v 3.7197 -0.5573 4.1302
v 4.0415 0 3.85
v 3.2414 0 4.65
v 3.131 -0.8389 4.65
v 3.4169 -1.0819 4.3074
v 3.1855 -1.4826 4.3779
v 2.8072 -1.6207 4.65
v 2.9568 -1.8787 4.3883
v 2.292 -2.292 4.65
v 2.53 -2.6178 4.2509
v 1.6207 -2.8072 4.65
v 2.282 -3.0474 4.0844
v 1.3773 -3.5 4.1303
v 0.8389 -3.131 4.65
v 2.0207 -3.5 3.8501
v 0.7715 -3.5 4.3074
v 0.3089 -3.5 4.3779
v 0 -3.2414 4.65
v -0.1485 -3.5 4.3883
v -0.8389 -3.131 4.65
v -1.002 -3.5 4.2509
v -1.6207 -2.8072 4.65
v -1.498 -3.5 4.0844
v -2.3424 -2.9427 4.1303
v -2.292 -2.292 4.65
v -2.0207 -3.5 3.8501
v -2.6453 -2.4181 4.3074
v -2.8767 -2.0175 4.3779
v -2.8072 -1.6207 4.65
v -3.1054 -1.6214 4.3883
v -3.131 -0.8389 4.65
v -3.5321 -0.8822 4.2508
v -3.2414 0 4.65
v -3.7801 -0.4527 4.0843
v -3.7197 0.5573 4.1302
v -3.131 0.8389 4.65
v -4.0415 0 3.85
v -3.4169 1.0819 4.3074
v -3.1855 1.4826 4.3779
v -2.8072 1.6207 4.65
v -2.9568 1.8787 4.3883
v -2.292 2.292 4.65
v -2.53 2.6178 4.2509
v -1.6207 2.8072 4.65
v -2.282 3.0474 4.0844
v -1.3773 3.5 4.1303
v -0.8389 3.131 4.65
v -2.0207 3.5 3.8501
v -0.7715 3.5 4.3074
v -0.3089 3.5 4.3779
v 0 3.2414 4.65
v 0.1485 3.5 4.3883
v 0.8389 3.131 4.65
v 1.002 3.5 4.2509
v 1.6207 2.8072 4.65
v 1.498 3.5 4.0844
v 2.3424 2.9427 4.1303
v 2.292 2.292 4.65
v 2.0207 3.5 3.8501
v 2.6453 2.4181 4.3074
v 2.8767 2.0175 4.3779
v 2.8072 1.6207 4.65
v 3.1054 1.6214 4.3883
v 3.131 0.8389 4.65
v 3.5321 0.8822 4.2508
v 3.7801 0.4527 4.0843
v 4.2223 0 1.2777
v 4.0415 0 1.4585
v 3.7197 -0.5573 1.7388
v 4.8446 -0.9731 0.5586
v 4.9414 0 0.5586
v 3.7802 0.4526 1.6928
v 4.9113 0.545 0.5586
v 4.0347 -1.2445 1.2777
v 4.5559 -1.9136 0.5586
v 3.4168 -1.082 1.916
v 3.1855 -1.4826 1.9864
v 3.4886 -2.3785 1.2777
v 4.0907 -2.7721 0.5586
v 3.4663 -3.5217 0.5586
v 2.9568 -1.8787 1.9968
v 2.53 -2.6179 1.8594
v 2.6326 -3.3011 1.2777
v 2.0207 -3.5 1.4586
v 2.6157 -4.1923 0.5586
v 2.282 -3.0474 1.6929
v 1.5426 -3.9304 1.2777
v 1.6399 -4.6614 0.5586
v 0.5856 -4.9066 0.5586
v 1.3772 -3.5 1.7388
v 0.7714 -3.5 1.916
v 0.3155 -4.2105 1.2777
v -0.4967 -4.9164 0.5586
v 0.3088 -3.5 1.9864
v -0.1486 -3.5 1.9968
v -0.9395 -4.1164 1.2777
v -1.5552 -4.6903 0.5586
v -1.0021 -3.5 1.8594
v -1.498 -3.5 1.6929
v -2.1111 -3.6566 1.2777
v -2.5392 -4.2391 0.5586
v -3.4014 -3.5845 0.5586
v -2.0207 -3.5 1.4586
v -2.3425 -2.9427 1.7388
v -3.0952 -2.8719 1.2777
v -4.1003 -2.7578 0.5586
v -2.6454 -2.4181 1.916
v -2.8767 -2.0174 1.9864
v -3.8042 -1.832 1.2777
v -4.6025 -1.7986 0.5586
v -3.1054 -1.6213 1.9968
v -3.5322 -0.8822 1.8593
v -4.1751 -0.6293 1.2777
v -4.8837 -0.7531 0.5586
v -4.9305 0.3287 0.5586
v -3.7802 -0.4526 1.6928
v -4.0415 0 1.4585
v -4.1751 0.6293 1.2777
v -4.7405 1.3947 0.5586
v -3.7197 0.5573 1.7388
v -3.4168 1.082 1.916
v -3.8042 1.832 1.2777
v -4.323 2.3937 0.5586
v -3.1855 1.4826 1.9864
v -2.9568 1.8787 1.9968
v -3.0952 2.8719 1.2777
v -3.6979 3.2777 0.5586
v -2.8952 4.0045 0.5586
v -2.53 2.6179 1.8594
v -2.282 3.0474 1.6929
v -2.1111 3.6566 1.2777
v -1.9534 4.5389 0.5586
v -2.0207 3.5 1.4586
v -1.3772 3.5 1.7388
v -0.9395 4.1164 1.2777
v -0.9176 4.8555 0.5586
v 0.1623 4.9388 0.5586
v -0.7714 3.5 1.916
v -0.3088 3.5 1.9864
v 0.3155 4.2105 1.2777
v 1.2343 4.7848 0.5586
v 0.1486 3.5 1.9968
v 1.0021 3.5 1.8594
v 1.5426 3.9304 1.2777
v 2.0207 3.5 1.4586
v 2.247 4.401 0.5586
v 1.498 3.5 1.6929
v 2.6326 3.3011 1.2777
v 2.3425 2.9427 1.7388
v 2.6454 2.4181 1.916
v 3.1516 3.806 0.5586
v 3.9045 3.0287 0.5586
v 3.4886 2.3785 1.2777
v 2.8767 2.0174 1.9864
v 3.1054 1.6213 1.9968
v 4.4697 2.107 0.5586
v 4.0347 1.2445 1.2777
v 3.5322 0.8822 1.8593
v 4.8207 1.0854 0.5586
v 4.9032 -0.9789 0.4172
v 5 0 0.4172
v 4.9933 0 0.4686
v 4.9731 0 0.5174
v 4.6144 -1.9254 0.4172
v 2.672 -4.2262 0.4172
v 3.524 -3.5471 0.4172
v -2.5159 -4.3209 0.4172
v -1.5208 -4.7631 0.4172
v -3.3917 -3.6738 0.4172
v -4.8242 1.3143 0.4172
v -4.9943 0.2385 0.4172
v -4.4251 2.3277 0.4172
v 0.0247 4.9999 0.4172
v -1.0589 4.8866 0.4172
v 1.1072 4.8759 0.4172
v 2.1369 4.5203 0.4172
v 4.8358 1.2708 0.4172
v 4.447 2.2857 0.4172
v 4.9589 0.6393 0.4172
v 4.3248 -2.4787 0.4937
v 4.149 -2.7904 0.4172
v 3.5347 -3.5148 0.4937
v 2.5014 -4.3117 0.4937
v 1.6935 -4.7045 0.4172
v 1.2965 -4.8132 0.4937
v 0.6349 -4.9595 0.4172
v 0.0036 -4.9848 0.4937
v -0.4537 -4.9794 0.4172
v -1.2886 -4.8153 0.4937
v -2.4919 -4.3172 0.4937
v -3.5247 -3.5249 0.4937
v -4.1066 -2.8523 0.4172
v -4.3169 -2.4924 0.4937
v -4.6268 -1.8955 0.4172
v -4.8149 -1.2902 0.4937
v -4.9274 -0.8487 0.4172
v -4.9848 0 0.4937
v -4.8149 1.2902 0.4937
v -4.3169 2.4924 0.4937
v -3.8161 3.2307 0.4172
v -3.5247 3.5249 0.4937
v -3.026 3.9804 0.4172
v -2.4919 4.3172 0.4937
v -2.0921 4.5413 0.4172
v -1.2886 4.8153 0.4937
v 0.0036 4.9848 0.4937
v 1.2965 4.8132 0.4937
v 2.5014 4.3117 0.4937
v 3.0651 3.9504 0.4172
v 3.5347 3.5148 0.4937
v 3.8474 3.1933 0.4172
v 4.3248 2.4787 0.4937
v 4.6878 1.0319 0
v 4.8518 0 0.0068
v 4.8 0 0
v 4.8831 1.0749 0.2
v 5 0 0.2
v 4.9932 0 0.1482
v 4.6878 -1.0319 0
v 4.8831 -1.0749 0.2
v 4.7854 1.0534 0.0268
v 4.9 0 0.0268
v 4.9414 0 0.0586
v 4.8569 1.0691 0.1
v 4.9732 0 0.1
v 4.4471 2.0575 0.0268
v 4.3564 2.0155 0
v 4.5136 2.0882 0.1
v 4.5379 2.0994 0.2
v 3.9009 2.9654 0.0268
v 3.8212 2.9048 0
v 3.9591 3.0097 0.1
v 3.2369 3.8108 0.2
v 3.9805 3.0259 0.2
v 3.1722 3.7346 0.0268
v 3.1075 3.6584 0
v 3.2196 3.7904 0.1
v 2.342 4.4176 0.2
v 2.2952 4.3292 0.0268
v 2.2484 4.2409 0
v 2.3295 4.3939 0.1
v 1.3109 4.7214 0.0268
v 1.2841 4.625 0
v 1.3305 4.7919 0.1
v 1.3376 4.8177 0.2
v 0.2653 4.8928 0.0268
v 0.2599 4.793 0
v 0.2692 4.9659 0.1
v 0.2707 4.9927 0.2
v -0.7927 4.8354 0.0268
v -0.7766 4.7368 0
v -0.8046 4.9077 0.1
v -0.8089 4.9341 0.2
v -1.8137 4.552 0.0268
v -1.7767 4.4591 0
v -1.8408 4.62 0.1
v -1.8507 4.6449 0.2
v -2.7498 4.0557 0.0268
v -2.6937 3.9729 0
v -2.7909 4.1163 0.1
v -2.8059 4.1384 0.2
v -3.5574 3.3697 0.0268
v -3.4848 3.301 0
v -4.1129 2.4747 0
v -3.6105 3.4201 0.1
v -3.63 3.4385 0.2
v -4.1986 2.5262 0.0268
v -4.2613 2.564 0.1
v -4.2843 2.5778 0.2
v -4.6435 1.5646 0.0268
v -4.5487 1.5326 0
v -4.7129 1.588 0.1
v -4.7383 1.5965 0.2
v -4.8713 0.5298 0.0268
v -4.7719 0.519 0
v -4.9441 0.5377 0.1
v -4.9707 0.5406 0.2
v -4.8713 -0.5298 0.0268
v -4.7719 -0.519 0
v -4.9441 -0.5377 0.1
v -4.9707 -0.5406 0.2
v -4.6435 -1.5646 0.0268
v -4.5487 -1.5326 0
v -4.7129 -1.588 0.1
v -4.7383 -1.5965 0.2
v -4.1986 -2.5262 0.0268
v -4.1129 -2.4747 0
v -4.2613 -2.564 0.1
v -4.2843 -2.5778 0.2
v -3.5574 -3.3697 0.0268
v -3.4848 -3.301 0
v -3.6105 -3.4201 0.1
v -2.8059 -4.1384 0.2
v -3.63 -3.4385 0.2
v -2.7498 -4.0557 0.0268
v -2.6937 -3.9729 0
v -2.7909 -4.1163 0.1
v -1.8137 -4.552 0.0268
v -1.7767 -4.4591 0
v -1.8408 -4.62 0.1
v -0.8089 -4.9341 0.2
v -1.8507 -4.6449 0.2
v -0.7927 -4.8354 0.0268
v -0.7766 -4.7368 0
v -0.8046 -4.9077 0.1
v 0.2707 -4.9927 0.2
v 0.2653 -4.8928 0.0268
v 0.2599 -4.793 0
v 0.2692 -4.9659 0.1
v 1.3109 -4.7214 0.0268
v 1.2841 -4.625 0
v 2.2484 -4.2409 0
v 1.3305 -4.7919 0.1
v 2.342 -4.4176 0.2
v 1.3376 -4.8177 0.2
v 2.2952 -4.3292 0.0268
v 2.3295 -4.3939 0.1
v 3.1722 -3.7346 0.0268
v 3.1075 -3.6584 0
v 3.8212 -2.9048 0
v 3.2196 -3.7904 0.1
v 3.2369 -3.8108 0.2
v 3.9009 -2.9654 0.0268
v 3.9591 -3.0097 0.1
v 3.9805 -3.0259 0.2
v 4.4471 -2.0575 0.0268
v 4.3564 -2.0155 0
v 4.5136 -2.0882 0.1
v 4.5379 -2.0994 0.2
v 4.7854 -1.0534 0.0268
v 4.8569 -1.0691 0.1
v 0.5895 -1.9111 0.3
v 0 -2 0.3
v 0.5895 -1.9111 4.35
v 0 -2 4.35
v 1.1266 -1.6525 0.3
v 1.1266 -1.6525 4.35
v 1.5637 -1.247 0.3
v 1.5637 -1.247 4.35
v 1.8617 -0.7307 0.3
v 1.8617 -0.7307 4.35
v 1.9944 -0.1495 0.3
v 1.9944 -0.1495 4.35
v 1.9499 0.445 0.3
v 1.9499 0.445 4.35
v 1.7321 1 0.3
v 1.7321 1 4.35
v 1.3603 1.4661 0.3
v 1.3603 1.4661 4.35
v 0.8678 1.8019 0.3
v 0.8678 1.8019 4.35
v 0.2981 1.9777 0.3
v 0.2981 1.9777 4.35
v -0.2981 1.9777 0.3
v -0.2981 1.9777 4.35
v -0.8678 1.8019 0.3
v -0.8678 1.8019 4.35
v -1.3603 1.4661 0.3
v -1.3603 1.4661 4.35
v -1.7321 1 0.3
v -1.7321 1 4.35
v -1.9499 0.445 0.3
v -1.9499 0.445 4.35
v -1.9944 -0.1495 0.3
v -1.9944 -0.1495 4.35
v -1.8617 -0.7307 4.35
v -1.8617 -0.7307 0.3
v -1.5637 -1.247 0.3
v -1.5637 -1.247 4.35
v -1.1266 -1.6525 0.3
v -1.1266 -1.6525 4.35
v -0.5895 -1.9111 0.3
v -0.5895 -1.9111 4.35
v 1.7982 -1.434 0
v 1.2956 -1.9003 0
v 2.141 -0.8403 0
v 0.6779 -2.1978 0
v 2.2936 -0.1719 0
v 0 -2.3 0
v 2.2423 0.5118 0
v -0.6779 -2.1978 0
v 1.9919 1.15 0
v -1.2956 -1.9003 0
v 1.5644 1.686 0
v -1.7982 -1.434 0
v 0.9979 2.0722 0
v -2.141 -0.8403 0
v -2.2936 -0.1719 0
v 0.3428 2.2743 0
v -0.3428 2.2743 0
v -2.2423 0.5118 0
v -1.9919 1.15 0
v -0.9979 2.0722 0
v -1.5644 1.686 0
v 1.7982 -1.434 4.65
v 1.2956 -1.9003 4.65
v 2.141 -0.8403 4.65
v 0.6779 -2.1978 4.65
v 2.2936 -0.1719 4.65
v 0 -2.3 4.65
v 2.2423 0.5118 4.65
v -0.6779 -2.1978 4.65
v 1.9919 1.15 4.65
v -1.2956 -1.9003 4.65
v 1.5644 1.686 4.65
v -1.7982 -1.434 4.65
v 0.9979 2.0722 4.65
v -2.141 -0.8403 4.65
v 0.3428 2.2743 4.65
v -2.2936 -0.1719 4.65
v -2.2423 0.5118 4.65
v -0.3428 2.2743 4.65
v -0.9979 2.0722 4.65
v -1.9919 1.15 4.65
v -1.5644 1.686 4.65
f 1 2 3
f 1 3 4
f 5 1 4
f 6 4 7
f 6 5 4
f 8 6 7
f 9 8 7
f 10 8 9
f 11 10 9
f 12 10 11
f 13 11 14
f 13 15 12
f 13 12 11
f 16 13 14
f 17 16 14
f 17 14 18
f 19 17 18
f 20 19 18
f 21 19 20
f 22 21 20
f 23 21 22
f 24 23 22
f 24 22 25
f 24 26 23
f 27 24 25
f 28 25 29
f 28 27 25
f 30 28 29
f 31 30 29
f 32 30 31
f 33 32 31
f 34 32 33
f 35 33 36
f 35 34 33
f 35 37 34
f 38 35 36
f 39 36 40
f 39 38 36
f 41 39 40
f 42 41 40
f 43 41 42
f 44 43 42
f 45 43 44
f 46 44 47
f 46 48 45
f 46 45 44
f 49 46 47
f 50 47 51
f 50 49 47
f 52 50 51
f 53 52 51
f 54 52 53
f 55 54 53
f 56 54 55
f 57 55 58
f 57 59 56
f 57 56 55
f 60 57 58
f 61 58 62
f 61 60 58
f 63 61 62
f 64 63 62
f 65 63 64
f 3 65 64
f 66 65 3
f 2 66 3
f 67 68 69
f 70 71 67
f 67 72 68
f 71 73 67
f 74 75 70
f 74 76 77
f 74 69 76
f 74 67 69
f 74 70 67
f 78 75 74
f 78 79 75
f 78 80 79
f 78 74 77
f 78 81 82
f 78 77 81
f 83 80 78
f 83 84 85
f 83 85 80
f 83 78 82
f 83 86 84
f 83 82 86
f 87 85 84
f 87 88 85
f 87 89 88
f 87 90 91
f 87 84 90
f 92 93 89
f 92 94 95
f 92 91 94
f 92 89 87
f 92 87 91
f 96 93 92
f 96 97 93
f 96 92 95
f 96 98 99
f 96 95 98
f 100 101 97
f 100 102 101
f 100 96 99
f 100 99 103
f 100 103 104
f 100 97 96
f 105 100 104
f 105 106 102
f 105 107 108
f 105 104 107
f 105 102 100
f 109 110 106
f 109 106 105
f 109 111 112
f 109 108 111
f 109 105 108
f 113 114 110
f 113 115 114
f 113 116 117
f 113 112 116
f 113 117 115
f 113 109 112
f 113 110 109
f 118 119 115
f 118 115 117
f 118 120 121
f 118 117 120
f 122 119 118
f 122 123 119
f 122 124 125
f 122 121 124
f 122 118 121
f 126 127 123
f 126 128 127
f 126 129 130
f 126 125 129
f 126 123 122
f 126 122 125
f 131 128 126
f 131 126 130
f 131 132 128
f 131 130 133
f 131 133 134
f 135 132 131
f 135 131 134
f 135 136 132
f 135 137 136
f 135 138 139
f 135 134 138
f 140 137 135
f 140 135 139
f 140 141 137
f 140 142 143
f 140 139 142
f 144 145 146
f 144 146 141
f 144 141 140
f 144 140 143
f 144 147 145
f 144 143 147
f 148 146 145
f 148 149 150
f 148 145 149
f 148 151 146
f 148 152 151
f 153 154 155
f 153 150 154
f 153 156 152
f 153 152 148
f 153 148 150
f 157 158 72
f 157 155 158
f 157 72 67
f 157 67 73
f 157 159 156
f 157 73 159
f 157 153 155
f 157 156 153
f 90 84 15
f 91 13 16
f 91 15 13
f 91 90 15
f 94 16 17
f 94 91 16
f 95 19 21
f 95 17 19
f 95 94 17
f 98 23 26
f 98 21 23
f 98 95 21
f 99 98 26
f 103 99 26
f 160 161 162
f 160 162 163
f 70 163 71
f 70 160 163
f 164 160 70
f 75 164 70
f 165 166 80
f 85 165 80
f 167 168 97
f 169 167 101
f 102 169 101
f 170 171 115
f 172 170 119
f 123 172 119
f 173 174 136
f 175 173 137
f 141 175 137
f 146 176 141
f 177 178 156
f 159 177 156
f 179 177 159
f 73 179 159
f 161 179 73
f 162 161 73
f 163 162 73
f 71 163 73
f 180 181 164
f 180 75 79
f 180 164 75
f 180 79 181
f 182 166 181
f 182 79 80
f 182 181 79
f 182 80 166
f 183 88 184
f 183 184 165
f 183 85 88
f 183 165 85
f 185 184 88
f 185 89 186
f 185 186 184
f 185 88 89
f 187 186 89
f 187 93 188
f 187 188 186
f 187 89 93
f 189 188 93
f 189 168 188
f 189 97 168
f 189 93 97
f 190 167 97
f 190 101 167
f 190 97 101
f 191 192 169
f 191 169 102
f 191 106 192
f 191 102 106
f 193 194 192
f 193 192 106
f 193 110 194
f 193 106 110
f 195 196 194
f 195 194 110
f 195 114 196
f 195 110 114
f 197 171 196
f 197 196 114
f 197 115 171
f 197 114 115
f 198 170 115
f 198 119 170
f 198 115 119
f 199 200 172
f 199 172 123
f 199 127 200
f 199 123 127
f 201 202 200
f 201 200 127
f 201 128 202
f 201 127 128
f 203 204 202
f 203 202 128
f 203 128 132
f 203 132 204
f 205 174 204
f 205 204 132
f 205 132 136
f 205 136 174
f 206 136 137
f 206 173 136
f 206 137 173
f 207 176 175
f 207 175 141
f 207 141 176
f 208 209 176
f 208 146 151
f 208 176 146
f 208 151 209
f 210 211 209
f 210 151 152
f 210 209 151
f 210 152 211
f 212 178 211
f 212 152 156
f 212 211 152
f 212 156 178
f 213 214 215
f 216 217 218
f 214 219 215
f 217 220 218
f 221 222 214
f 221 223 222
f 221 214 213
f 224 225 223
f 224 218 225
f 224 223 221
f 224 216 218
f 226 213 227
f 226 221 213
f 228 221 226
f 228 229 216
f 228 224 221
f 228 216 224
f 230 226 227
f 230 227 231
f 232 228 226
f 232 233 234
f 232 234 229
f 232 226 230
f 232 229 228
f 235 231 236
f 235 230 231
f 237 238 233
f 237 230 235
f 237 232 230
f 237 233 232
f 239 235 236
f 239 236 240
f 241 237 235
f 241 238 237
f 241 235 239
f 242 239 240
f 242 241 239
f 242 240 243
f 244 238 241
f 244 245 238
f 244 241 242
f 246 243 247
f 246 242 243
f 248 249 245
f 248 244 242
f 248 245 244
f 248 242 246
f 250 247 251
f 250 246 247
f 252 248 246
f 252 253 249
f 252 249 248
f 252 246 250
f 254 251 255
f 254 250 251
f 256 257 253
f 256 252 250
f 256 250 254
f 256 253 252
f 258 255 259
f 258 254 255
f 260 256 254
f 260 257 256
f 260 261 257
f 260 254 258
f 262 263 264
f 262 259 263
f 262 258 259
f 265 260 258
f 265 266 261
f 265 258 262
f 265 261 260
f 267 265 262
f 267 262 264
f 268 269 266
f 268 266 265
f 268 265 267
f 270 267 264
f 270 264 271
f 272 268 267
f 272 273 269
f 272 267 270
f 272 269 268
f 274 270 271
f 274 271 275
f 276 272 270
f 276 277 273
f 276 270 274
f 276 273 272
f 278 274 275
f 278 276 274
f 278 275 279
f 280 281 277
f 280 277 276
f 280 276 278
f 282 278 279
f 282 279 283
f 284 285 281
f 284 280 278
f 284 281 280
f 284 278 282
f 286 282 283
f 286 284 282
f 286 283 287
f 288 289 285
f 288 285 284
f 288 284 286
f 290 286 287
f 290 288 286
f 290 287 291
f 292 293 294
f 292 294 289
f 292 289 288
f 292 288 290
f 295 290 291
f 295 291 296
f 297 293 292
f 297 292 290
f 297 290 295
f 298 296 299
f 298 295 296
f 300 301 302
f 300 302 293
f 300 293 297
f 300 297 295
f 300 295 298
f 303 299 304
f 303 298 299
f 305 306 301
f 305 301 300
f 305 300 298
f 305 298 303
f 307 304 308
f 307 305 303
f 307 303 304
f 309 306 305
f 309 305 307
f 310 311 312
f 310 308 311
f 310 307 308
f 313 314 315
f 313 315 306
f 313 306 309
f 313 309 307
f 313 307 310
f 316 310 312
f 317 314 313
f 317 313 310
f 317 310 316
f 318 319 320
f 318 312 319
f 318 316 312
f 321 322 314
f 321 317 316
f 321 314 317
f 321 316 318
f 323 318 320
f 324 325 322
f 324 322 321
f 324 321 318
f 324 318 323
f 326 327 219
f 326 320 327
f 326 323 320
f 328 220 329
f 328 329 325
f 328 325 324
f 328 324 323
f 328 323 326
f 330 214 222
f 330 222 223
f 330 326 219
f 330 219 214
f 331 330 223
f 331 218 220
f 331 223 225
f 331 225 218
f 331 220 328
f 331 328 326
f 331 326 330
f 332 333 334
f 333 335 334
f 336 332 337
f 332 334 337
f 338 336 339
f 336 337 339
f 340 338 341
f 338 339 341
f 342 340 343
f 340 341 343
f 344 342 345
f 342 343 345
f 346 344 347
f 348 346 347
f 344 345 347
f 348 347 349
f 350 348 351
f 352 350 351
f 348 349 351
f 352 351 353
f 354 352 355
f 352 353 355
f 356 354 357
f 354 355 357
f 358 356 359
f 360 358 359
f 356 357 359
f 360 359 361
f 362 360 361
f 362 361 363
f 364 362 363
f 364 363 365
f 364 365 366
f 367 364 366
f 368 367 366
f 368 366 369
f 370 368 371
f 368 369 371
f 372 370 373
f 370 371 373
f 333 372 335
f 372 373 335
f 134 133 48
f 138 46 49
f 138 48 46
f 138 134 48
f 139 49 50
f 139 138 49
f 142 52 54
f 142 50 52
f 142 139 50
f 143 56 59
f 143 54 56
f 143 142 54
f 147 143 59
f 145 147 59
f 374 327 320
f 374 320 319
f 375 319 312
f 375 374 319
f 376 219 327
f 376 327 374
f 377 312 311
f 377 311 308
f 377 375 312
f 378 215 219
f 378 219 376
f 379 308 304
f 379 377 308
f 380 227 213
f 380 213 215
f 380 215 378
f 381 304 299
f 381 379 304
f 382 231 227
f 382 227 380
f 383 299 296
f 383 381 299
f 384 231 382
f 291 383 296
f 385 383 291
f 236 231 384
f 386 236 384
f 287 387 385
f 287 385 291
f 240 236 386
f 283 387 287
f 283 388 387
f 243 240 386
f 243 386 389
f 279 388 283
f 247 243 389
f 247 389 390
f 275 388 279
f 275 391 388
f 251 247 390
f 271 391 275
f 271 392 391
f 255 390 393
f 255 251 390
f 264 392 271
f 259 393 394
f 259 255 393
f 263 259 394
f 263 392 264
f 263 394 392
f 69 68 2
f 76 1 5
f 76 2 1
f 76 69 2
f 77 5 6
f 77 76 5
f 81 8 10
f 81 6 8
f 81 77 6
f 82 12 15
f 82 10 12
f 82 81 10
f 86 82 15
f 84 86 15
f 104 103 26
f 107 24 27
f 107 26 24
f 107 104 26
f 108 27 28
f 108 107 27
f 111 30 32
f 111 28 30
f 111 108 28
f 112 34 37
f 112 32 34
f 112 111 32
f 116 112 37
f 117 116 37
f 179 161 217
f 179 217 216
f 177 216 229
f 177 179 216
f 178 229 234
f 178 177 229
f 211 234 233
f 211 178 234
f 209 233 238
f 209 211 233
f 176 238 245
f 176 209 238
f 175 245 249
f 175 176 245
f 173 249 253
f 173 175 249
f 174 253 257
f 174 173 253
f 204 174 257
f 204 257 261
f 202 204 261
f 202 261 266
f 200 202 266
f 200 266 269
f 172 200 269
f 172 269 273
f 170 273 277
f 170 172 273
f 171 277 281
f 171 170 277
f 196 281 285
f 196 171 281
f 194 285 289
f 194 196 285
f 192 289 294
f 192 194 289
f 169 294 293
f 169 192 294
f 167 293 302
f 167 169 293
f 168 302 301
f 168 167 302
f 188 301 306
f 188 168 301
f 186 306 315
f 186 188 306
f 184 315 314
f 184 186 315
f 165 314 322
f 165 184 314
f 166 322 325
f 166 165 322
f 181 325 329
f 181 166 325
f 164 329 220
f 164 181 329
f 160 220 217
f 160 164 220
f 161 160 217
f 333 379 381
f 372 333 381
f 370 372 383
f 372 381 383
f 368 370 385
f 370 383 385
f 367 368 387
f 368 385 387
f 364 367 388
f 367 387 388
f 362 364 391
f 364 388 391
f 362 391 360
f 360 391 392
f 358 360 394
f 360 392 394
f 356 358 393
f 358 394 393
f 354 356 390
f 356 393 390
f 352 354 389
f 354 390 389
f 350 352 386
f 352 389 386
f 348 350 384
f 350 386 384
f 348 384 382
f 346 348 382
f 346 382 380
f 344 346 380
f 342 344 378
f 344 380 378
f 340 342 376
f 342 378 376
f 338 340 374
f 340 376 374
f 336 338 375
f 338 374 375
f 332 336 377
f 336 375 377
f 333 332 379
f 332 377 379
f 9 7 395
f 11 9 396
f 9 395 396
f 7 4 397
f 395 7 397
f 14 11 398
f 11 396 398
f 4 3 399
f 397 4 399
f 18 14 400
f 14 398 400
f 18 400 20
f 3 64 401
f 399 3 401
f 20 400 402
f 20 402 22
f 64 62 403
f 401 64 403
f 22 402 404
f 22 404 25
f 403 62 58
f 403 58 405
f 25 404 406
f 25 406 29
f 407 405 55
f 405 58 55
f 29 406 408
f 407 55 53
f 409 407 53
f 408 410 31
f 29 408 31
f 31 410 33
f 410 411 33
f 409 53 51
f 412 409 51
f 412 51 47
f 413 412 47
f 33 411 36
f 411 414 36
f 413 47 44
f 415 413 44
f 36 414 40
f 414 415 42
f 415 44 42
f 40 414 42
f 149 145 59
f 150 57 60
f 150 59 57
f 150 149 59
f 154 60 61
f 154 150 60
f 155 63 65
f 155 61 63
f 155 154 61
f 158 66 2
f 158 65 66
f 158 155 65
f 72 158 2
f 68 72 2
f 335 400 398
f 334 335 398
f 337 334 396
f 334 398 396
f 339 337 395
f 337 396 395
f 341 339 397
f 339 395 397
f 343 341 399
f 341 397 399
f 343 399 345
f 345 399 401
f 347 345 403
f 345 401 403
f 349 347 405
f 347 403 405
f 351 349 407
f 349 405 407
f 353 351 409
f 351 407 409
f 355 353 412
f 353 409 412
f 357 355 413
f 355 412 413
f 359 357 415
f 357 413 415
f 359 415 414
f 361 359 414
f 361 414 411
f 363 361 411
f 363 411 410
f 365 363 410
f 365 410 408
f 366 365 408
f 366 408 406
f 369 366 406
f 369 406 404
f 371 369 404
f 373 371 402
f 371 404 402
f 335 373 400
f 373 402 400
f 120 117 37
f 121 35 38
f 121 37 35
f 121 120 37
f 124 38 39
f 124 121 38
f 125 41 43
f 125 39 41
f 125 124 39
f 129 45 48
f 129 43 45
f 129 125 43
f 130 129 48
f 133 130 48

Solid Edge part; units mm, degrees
sketch "Sketch1" plane through (0, 0, 0) normal (0, 0, 1) x (1, 0, 0)
  line L0 (-2.0207, 3.5) -> (2.0207, 3.5)
  line L1 (2.0207, 3.5) -> (4.0415, 0)
  line L2 (4.0415, 0) -> (2.0207, -3.5)
  line L3 (2.0207, -3.5) -> (-2.0207, -3.5)
  line L4 (-2.0207, -3.5) -> (-4.0415, 0)
  line L5 (-4.0415, 0) -> (-2.0207, 3.5)
  dimension "D1" = 7
extrude "Protrusion1" add sketch "Sketch1" along normal blind 4.65
sketch "Sketch2" plane through (0, 0, 0) normal (0, -1, 0) x (1, 0, 0)
  line L0 (4.0415, 3.85) -> (2.574, 5.3174)
  line L1 (2.574, 5.3174) -> (4.6962, 5.3174)
  line L2 (4.6962, 5.3174) -> (4.6962, 3.85)
  line L3 (4.6962, 3.85) -> (4.0415, 3.85)
  dimension "D1" = 0.8
revolve "RevolvedCutout1" cut sketch "Sketch2" angle 360 about axis through (0, 0, 54) along (0, 0, -1)
sketch "Sketch3" plane through (0, 0, 0) normal (0, -1, 0) x (1, 0, 0)
  line L0 (0, 0) -> (5, 0)
  line L1 (5, 0) -> (5, 0.5)
  line L2 (5, 0.5) -> (2.7639, 2.7361)
  line L3 (2.7639, 2.7361) -> (0, 2.7361)
  line L4 (0, 2.7361) -> (0, 0)
  dimension "D1" = 5
  dimension "D2" = 0.5
revolve "RevolvedProtrusion1" add sketch "Sketch3" angle 360 about axis through (0, 0, 54) along (0, 0, -1)
fillet "Verrundung_1" radius 0.2 2 edges at (-5, 0, 0.5) (-5, 0, 0)
hole "Bohrung_1" at (0, 0, 4.65) direction (0, 0, -1) diameter 4 end through all
chamfer "Fase_1" distance 0.3 angle 45 2 edges at (0, 2, 4.65) (2, 0, 0)
